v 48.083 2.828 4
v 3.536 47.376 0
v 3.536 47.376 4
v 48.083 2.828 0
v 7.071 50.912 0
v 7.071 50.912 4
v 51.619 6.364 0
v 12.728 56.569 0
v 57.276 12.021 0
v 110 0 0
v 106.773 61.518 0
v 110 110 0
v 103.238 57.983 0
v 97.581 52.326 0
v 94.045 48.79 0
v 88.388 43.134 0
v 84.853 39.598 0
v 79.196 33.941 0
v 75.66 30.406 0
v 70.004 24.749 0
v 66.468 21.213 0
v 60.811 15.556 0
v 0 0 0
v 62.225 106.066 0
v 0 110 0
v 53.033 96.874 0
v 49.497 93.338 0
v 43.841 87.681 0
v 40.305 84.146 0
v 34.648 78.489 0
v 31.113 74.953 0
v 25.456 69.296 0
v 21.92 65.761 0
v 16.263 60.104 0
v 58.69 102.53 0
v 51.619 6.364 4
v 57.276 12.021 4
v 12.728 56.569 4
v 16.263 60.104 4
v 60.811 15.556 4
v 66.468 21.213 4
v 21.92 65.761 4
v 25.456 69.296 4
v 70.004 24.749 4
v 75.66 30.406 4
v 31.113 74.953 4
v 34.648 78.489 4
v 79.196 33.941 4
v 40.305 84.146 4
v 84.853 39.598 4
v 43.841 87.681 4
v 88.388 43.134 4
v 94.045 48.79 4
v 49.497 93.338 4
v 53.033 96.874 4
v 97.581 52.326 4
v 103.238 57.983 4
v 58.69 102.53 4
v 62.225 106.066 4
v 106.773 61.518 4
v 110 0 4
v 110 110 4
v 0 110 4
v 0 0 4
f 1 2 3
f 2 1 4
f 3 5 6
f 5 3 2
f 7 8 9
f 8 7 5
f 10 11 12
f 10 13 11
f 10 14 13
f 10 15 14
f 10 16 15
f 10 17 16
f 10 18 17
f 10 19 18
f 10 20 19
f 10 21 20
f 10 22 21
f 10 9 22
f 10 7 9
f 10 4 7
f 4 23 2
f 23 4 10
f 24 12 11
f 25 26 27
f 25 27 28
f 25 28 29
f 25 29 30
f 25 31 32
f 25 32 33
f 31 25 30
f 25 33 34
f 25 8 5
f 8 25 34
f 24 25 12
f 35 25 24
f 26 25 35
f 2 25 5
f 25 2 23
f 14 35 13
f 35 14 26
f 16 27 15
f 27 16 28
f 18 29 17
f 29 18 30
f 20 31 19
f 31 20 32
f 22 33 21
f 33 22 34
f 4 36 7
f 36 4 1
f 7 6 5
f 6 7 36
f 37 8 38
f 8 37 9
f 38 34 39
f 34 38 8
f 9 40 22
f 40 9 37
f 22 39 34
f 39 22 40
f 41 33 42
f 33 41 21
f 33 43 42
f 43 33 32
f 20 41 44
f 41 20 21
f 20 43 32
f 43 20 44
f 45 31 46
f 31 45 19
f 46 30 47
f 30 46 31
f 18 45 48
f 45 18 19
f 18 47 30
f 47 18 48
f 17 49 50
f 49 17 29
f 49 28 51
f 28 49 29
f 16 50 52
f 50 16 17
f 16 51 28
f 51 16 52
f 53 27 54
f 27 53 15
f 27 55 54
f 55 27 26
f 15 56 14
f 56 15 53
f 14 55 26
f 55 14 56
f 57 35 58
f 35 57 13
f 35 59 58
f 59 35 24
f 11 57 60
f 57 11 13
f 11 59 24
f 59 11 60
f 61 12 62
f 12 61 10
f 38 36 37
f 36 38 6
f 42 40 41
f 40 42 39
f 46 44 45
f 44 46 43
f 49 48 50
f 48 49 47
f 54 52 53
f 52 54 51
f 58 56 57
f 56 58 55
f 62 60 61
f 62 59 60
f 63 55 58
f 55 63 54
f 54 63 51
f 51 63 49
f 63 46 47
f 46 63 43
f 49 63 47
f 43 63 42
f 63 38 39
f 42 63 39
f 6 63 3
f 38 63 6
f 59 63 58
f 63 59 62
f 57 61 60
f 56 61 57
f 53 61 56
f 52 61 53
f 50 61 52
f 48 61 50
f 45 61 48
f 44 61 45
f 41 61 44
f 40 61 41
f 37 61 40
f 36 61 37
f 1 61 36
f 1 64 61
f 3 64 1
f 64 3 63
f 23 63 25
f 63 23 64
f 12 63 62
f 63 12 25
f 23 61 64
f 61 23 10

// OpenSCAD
w = 110;
d = 110;
h = 4;

wh = 5;
wh_gap = 8;

difference(){
cube([w, d, h])

rotate([10,10,2]);
for (i = [0:6]){
    color("red")
    rotate([0,0,45])
    translate([36 + (wh + wh_gap)*i, 0 -32])
    cube([wh, d - 47, 6]);
}
}
